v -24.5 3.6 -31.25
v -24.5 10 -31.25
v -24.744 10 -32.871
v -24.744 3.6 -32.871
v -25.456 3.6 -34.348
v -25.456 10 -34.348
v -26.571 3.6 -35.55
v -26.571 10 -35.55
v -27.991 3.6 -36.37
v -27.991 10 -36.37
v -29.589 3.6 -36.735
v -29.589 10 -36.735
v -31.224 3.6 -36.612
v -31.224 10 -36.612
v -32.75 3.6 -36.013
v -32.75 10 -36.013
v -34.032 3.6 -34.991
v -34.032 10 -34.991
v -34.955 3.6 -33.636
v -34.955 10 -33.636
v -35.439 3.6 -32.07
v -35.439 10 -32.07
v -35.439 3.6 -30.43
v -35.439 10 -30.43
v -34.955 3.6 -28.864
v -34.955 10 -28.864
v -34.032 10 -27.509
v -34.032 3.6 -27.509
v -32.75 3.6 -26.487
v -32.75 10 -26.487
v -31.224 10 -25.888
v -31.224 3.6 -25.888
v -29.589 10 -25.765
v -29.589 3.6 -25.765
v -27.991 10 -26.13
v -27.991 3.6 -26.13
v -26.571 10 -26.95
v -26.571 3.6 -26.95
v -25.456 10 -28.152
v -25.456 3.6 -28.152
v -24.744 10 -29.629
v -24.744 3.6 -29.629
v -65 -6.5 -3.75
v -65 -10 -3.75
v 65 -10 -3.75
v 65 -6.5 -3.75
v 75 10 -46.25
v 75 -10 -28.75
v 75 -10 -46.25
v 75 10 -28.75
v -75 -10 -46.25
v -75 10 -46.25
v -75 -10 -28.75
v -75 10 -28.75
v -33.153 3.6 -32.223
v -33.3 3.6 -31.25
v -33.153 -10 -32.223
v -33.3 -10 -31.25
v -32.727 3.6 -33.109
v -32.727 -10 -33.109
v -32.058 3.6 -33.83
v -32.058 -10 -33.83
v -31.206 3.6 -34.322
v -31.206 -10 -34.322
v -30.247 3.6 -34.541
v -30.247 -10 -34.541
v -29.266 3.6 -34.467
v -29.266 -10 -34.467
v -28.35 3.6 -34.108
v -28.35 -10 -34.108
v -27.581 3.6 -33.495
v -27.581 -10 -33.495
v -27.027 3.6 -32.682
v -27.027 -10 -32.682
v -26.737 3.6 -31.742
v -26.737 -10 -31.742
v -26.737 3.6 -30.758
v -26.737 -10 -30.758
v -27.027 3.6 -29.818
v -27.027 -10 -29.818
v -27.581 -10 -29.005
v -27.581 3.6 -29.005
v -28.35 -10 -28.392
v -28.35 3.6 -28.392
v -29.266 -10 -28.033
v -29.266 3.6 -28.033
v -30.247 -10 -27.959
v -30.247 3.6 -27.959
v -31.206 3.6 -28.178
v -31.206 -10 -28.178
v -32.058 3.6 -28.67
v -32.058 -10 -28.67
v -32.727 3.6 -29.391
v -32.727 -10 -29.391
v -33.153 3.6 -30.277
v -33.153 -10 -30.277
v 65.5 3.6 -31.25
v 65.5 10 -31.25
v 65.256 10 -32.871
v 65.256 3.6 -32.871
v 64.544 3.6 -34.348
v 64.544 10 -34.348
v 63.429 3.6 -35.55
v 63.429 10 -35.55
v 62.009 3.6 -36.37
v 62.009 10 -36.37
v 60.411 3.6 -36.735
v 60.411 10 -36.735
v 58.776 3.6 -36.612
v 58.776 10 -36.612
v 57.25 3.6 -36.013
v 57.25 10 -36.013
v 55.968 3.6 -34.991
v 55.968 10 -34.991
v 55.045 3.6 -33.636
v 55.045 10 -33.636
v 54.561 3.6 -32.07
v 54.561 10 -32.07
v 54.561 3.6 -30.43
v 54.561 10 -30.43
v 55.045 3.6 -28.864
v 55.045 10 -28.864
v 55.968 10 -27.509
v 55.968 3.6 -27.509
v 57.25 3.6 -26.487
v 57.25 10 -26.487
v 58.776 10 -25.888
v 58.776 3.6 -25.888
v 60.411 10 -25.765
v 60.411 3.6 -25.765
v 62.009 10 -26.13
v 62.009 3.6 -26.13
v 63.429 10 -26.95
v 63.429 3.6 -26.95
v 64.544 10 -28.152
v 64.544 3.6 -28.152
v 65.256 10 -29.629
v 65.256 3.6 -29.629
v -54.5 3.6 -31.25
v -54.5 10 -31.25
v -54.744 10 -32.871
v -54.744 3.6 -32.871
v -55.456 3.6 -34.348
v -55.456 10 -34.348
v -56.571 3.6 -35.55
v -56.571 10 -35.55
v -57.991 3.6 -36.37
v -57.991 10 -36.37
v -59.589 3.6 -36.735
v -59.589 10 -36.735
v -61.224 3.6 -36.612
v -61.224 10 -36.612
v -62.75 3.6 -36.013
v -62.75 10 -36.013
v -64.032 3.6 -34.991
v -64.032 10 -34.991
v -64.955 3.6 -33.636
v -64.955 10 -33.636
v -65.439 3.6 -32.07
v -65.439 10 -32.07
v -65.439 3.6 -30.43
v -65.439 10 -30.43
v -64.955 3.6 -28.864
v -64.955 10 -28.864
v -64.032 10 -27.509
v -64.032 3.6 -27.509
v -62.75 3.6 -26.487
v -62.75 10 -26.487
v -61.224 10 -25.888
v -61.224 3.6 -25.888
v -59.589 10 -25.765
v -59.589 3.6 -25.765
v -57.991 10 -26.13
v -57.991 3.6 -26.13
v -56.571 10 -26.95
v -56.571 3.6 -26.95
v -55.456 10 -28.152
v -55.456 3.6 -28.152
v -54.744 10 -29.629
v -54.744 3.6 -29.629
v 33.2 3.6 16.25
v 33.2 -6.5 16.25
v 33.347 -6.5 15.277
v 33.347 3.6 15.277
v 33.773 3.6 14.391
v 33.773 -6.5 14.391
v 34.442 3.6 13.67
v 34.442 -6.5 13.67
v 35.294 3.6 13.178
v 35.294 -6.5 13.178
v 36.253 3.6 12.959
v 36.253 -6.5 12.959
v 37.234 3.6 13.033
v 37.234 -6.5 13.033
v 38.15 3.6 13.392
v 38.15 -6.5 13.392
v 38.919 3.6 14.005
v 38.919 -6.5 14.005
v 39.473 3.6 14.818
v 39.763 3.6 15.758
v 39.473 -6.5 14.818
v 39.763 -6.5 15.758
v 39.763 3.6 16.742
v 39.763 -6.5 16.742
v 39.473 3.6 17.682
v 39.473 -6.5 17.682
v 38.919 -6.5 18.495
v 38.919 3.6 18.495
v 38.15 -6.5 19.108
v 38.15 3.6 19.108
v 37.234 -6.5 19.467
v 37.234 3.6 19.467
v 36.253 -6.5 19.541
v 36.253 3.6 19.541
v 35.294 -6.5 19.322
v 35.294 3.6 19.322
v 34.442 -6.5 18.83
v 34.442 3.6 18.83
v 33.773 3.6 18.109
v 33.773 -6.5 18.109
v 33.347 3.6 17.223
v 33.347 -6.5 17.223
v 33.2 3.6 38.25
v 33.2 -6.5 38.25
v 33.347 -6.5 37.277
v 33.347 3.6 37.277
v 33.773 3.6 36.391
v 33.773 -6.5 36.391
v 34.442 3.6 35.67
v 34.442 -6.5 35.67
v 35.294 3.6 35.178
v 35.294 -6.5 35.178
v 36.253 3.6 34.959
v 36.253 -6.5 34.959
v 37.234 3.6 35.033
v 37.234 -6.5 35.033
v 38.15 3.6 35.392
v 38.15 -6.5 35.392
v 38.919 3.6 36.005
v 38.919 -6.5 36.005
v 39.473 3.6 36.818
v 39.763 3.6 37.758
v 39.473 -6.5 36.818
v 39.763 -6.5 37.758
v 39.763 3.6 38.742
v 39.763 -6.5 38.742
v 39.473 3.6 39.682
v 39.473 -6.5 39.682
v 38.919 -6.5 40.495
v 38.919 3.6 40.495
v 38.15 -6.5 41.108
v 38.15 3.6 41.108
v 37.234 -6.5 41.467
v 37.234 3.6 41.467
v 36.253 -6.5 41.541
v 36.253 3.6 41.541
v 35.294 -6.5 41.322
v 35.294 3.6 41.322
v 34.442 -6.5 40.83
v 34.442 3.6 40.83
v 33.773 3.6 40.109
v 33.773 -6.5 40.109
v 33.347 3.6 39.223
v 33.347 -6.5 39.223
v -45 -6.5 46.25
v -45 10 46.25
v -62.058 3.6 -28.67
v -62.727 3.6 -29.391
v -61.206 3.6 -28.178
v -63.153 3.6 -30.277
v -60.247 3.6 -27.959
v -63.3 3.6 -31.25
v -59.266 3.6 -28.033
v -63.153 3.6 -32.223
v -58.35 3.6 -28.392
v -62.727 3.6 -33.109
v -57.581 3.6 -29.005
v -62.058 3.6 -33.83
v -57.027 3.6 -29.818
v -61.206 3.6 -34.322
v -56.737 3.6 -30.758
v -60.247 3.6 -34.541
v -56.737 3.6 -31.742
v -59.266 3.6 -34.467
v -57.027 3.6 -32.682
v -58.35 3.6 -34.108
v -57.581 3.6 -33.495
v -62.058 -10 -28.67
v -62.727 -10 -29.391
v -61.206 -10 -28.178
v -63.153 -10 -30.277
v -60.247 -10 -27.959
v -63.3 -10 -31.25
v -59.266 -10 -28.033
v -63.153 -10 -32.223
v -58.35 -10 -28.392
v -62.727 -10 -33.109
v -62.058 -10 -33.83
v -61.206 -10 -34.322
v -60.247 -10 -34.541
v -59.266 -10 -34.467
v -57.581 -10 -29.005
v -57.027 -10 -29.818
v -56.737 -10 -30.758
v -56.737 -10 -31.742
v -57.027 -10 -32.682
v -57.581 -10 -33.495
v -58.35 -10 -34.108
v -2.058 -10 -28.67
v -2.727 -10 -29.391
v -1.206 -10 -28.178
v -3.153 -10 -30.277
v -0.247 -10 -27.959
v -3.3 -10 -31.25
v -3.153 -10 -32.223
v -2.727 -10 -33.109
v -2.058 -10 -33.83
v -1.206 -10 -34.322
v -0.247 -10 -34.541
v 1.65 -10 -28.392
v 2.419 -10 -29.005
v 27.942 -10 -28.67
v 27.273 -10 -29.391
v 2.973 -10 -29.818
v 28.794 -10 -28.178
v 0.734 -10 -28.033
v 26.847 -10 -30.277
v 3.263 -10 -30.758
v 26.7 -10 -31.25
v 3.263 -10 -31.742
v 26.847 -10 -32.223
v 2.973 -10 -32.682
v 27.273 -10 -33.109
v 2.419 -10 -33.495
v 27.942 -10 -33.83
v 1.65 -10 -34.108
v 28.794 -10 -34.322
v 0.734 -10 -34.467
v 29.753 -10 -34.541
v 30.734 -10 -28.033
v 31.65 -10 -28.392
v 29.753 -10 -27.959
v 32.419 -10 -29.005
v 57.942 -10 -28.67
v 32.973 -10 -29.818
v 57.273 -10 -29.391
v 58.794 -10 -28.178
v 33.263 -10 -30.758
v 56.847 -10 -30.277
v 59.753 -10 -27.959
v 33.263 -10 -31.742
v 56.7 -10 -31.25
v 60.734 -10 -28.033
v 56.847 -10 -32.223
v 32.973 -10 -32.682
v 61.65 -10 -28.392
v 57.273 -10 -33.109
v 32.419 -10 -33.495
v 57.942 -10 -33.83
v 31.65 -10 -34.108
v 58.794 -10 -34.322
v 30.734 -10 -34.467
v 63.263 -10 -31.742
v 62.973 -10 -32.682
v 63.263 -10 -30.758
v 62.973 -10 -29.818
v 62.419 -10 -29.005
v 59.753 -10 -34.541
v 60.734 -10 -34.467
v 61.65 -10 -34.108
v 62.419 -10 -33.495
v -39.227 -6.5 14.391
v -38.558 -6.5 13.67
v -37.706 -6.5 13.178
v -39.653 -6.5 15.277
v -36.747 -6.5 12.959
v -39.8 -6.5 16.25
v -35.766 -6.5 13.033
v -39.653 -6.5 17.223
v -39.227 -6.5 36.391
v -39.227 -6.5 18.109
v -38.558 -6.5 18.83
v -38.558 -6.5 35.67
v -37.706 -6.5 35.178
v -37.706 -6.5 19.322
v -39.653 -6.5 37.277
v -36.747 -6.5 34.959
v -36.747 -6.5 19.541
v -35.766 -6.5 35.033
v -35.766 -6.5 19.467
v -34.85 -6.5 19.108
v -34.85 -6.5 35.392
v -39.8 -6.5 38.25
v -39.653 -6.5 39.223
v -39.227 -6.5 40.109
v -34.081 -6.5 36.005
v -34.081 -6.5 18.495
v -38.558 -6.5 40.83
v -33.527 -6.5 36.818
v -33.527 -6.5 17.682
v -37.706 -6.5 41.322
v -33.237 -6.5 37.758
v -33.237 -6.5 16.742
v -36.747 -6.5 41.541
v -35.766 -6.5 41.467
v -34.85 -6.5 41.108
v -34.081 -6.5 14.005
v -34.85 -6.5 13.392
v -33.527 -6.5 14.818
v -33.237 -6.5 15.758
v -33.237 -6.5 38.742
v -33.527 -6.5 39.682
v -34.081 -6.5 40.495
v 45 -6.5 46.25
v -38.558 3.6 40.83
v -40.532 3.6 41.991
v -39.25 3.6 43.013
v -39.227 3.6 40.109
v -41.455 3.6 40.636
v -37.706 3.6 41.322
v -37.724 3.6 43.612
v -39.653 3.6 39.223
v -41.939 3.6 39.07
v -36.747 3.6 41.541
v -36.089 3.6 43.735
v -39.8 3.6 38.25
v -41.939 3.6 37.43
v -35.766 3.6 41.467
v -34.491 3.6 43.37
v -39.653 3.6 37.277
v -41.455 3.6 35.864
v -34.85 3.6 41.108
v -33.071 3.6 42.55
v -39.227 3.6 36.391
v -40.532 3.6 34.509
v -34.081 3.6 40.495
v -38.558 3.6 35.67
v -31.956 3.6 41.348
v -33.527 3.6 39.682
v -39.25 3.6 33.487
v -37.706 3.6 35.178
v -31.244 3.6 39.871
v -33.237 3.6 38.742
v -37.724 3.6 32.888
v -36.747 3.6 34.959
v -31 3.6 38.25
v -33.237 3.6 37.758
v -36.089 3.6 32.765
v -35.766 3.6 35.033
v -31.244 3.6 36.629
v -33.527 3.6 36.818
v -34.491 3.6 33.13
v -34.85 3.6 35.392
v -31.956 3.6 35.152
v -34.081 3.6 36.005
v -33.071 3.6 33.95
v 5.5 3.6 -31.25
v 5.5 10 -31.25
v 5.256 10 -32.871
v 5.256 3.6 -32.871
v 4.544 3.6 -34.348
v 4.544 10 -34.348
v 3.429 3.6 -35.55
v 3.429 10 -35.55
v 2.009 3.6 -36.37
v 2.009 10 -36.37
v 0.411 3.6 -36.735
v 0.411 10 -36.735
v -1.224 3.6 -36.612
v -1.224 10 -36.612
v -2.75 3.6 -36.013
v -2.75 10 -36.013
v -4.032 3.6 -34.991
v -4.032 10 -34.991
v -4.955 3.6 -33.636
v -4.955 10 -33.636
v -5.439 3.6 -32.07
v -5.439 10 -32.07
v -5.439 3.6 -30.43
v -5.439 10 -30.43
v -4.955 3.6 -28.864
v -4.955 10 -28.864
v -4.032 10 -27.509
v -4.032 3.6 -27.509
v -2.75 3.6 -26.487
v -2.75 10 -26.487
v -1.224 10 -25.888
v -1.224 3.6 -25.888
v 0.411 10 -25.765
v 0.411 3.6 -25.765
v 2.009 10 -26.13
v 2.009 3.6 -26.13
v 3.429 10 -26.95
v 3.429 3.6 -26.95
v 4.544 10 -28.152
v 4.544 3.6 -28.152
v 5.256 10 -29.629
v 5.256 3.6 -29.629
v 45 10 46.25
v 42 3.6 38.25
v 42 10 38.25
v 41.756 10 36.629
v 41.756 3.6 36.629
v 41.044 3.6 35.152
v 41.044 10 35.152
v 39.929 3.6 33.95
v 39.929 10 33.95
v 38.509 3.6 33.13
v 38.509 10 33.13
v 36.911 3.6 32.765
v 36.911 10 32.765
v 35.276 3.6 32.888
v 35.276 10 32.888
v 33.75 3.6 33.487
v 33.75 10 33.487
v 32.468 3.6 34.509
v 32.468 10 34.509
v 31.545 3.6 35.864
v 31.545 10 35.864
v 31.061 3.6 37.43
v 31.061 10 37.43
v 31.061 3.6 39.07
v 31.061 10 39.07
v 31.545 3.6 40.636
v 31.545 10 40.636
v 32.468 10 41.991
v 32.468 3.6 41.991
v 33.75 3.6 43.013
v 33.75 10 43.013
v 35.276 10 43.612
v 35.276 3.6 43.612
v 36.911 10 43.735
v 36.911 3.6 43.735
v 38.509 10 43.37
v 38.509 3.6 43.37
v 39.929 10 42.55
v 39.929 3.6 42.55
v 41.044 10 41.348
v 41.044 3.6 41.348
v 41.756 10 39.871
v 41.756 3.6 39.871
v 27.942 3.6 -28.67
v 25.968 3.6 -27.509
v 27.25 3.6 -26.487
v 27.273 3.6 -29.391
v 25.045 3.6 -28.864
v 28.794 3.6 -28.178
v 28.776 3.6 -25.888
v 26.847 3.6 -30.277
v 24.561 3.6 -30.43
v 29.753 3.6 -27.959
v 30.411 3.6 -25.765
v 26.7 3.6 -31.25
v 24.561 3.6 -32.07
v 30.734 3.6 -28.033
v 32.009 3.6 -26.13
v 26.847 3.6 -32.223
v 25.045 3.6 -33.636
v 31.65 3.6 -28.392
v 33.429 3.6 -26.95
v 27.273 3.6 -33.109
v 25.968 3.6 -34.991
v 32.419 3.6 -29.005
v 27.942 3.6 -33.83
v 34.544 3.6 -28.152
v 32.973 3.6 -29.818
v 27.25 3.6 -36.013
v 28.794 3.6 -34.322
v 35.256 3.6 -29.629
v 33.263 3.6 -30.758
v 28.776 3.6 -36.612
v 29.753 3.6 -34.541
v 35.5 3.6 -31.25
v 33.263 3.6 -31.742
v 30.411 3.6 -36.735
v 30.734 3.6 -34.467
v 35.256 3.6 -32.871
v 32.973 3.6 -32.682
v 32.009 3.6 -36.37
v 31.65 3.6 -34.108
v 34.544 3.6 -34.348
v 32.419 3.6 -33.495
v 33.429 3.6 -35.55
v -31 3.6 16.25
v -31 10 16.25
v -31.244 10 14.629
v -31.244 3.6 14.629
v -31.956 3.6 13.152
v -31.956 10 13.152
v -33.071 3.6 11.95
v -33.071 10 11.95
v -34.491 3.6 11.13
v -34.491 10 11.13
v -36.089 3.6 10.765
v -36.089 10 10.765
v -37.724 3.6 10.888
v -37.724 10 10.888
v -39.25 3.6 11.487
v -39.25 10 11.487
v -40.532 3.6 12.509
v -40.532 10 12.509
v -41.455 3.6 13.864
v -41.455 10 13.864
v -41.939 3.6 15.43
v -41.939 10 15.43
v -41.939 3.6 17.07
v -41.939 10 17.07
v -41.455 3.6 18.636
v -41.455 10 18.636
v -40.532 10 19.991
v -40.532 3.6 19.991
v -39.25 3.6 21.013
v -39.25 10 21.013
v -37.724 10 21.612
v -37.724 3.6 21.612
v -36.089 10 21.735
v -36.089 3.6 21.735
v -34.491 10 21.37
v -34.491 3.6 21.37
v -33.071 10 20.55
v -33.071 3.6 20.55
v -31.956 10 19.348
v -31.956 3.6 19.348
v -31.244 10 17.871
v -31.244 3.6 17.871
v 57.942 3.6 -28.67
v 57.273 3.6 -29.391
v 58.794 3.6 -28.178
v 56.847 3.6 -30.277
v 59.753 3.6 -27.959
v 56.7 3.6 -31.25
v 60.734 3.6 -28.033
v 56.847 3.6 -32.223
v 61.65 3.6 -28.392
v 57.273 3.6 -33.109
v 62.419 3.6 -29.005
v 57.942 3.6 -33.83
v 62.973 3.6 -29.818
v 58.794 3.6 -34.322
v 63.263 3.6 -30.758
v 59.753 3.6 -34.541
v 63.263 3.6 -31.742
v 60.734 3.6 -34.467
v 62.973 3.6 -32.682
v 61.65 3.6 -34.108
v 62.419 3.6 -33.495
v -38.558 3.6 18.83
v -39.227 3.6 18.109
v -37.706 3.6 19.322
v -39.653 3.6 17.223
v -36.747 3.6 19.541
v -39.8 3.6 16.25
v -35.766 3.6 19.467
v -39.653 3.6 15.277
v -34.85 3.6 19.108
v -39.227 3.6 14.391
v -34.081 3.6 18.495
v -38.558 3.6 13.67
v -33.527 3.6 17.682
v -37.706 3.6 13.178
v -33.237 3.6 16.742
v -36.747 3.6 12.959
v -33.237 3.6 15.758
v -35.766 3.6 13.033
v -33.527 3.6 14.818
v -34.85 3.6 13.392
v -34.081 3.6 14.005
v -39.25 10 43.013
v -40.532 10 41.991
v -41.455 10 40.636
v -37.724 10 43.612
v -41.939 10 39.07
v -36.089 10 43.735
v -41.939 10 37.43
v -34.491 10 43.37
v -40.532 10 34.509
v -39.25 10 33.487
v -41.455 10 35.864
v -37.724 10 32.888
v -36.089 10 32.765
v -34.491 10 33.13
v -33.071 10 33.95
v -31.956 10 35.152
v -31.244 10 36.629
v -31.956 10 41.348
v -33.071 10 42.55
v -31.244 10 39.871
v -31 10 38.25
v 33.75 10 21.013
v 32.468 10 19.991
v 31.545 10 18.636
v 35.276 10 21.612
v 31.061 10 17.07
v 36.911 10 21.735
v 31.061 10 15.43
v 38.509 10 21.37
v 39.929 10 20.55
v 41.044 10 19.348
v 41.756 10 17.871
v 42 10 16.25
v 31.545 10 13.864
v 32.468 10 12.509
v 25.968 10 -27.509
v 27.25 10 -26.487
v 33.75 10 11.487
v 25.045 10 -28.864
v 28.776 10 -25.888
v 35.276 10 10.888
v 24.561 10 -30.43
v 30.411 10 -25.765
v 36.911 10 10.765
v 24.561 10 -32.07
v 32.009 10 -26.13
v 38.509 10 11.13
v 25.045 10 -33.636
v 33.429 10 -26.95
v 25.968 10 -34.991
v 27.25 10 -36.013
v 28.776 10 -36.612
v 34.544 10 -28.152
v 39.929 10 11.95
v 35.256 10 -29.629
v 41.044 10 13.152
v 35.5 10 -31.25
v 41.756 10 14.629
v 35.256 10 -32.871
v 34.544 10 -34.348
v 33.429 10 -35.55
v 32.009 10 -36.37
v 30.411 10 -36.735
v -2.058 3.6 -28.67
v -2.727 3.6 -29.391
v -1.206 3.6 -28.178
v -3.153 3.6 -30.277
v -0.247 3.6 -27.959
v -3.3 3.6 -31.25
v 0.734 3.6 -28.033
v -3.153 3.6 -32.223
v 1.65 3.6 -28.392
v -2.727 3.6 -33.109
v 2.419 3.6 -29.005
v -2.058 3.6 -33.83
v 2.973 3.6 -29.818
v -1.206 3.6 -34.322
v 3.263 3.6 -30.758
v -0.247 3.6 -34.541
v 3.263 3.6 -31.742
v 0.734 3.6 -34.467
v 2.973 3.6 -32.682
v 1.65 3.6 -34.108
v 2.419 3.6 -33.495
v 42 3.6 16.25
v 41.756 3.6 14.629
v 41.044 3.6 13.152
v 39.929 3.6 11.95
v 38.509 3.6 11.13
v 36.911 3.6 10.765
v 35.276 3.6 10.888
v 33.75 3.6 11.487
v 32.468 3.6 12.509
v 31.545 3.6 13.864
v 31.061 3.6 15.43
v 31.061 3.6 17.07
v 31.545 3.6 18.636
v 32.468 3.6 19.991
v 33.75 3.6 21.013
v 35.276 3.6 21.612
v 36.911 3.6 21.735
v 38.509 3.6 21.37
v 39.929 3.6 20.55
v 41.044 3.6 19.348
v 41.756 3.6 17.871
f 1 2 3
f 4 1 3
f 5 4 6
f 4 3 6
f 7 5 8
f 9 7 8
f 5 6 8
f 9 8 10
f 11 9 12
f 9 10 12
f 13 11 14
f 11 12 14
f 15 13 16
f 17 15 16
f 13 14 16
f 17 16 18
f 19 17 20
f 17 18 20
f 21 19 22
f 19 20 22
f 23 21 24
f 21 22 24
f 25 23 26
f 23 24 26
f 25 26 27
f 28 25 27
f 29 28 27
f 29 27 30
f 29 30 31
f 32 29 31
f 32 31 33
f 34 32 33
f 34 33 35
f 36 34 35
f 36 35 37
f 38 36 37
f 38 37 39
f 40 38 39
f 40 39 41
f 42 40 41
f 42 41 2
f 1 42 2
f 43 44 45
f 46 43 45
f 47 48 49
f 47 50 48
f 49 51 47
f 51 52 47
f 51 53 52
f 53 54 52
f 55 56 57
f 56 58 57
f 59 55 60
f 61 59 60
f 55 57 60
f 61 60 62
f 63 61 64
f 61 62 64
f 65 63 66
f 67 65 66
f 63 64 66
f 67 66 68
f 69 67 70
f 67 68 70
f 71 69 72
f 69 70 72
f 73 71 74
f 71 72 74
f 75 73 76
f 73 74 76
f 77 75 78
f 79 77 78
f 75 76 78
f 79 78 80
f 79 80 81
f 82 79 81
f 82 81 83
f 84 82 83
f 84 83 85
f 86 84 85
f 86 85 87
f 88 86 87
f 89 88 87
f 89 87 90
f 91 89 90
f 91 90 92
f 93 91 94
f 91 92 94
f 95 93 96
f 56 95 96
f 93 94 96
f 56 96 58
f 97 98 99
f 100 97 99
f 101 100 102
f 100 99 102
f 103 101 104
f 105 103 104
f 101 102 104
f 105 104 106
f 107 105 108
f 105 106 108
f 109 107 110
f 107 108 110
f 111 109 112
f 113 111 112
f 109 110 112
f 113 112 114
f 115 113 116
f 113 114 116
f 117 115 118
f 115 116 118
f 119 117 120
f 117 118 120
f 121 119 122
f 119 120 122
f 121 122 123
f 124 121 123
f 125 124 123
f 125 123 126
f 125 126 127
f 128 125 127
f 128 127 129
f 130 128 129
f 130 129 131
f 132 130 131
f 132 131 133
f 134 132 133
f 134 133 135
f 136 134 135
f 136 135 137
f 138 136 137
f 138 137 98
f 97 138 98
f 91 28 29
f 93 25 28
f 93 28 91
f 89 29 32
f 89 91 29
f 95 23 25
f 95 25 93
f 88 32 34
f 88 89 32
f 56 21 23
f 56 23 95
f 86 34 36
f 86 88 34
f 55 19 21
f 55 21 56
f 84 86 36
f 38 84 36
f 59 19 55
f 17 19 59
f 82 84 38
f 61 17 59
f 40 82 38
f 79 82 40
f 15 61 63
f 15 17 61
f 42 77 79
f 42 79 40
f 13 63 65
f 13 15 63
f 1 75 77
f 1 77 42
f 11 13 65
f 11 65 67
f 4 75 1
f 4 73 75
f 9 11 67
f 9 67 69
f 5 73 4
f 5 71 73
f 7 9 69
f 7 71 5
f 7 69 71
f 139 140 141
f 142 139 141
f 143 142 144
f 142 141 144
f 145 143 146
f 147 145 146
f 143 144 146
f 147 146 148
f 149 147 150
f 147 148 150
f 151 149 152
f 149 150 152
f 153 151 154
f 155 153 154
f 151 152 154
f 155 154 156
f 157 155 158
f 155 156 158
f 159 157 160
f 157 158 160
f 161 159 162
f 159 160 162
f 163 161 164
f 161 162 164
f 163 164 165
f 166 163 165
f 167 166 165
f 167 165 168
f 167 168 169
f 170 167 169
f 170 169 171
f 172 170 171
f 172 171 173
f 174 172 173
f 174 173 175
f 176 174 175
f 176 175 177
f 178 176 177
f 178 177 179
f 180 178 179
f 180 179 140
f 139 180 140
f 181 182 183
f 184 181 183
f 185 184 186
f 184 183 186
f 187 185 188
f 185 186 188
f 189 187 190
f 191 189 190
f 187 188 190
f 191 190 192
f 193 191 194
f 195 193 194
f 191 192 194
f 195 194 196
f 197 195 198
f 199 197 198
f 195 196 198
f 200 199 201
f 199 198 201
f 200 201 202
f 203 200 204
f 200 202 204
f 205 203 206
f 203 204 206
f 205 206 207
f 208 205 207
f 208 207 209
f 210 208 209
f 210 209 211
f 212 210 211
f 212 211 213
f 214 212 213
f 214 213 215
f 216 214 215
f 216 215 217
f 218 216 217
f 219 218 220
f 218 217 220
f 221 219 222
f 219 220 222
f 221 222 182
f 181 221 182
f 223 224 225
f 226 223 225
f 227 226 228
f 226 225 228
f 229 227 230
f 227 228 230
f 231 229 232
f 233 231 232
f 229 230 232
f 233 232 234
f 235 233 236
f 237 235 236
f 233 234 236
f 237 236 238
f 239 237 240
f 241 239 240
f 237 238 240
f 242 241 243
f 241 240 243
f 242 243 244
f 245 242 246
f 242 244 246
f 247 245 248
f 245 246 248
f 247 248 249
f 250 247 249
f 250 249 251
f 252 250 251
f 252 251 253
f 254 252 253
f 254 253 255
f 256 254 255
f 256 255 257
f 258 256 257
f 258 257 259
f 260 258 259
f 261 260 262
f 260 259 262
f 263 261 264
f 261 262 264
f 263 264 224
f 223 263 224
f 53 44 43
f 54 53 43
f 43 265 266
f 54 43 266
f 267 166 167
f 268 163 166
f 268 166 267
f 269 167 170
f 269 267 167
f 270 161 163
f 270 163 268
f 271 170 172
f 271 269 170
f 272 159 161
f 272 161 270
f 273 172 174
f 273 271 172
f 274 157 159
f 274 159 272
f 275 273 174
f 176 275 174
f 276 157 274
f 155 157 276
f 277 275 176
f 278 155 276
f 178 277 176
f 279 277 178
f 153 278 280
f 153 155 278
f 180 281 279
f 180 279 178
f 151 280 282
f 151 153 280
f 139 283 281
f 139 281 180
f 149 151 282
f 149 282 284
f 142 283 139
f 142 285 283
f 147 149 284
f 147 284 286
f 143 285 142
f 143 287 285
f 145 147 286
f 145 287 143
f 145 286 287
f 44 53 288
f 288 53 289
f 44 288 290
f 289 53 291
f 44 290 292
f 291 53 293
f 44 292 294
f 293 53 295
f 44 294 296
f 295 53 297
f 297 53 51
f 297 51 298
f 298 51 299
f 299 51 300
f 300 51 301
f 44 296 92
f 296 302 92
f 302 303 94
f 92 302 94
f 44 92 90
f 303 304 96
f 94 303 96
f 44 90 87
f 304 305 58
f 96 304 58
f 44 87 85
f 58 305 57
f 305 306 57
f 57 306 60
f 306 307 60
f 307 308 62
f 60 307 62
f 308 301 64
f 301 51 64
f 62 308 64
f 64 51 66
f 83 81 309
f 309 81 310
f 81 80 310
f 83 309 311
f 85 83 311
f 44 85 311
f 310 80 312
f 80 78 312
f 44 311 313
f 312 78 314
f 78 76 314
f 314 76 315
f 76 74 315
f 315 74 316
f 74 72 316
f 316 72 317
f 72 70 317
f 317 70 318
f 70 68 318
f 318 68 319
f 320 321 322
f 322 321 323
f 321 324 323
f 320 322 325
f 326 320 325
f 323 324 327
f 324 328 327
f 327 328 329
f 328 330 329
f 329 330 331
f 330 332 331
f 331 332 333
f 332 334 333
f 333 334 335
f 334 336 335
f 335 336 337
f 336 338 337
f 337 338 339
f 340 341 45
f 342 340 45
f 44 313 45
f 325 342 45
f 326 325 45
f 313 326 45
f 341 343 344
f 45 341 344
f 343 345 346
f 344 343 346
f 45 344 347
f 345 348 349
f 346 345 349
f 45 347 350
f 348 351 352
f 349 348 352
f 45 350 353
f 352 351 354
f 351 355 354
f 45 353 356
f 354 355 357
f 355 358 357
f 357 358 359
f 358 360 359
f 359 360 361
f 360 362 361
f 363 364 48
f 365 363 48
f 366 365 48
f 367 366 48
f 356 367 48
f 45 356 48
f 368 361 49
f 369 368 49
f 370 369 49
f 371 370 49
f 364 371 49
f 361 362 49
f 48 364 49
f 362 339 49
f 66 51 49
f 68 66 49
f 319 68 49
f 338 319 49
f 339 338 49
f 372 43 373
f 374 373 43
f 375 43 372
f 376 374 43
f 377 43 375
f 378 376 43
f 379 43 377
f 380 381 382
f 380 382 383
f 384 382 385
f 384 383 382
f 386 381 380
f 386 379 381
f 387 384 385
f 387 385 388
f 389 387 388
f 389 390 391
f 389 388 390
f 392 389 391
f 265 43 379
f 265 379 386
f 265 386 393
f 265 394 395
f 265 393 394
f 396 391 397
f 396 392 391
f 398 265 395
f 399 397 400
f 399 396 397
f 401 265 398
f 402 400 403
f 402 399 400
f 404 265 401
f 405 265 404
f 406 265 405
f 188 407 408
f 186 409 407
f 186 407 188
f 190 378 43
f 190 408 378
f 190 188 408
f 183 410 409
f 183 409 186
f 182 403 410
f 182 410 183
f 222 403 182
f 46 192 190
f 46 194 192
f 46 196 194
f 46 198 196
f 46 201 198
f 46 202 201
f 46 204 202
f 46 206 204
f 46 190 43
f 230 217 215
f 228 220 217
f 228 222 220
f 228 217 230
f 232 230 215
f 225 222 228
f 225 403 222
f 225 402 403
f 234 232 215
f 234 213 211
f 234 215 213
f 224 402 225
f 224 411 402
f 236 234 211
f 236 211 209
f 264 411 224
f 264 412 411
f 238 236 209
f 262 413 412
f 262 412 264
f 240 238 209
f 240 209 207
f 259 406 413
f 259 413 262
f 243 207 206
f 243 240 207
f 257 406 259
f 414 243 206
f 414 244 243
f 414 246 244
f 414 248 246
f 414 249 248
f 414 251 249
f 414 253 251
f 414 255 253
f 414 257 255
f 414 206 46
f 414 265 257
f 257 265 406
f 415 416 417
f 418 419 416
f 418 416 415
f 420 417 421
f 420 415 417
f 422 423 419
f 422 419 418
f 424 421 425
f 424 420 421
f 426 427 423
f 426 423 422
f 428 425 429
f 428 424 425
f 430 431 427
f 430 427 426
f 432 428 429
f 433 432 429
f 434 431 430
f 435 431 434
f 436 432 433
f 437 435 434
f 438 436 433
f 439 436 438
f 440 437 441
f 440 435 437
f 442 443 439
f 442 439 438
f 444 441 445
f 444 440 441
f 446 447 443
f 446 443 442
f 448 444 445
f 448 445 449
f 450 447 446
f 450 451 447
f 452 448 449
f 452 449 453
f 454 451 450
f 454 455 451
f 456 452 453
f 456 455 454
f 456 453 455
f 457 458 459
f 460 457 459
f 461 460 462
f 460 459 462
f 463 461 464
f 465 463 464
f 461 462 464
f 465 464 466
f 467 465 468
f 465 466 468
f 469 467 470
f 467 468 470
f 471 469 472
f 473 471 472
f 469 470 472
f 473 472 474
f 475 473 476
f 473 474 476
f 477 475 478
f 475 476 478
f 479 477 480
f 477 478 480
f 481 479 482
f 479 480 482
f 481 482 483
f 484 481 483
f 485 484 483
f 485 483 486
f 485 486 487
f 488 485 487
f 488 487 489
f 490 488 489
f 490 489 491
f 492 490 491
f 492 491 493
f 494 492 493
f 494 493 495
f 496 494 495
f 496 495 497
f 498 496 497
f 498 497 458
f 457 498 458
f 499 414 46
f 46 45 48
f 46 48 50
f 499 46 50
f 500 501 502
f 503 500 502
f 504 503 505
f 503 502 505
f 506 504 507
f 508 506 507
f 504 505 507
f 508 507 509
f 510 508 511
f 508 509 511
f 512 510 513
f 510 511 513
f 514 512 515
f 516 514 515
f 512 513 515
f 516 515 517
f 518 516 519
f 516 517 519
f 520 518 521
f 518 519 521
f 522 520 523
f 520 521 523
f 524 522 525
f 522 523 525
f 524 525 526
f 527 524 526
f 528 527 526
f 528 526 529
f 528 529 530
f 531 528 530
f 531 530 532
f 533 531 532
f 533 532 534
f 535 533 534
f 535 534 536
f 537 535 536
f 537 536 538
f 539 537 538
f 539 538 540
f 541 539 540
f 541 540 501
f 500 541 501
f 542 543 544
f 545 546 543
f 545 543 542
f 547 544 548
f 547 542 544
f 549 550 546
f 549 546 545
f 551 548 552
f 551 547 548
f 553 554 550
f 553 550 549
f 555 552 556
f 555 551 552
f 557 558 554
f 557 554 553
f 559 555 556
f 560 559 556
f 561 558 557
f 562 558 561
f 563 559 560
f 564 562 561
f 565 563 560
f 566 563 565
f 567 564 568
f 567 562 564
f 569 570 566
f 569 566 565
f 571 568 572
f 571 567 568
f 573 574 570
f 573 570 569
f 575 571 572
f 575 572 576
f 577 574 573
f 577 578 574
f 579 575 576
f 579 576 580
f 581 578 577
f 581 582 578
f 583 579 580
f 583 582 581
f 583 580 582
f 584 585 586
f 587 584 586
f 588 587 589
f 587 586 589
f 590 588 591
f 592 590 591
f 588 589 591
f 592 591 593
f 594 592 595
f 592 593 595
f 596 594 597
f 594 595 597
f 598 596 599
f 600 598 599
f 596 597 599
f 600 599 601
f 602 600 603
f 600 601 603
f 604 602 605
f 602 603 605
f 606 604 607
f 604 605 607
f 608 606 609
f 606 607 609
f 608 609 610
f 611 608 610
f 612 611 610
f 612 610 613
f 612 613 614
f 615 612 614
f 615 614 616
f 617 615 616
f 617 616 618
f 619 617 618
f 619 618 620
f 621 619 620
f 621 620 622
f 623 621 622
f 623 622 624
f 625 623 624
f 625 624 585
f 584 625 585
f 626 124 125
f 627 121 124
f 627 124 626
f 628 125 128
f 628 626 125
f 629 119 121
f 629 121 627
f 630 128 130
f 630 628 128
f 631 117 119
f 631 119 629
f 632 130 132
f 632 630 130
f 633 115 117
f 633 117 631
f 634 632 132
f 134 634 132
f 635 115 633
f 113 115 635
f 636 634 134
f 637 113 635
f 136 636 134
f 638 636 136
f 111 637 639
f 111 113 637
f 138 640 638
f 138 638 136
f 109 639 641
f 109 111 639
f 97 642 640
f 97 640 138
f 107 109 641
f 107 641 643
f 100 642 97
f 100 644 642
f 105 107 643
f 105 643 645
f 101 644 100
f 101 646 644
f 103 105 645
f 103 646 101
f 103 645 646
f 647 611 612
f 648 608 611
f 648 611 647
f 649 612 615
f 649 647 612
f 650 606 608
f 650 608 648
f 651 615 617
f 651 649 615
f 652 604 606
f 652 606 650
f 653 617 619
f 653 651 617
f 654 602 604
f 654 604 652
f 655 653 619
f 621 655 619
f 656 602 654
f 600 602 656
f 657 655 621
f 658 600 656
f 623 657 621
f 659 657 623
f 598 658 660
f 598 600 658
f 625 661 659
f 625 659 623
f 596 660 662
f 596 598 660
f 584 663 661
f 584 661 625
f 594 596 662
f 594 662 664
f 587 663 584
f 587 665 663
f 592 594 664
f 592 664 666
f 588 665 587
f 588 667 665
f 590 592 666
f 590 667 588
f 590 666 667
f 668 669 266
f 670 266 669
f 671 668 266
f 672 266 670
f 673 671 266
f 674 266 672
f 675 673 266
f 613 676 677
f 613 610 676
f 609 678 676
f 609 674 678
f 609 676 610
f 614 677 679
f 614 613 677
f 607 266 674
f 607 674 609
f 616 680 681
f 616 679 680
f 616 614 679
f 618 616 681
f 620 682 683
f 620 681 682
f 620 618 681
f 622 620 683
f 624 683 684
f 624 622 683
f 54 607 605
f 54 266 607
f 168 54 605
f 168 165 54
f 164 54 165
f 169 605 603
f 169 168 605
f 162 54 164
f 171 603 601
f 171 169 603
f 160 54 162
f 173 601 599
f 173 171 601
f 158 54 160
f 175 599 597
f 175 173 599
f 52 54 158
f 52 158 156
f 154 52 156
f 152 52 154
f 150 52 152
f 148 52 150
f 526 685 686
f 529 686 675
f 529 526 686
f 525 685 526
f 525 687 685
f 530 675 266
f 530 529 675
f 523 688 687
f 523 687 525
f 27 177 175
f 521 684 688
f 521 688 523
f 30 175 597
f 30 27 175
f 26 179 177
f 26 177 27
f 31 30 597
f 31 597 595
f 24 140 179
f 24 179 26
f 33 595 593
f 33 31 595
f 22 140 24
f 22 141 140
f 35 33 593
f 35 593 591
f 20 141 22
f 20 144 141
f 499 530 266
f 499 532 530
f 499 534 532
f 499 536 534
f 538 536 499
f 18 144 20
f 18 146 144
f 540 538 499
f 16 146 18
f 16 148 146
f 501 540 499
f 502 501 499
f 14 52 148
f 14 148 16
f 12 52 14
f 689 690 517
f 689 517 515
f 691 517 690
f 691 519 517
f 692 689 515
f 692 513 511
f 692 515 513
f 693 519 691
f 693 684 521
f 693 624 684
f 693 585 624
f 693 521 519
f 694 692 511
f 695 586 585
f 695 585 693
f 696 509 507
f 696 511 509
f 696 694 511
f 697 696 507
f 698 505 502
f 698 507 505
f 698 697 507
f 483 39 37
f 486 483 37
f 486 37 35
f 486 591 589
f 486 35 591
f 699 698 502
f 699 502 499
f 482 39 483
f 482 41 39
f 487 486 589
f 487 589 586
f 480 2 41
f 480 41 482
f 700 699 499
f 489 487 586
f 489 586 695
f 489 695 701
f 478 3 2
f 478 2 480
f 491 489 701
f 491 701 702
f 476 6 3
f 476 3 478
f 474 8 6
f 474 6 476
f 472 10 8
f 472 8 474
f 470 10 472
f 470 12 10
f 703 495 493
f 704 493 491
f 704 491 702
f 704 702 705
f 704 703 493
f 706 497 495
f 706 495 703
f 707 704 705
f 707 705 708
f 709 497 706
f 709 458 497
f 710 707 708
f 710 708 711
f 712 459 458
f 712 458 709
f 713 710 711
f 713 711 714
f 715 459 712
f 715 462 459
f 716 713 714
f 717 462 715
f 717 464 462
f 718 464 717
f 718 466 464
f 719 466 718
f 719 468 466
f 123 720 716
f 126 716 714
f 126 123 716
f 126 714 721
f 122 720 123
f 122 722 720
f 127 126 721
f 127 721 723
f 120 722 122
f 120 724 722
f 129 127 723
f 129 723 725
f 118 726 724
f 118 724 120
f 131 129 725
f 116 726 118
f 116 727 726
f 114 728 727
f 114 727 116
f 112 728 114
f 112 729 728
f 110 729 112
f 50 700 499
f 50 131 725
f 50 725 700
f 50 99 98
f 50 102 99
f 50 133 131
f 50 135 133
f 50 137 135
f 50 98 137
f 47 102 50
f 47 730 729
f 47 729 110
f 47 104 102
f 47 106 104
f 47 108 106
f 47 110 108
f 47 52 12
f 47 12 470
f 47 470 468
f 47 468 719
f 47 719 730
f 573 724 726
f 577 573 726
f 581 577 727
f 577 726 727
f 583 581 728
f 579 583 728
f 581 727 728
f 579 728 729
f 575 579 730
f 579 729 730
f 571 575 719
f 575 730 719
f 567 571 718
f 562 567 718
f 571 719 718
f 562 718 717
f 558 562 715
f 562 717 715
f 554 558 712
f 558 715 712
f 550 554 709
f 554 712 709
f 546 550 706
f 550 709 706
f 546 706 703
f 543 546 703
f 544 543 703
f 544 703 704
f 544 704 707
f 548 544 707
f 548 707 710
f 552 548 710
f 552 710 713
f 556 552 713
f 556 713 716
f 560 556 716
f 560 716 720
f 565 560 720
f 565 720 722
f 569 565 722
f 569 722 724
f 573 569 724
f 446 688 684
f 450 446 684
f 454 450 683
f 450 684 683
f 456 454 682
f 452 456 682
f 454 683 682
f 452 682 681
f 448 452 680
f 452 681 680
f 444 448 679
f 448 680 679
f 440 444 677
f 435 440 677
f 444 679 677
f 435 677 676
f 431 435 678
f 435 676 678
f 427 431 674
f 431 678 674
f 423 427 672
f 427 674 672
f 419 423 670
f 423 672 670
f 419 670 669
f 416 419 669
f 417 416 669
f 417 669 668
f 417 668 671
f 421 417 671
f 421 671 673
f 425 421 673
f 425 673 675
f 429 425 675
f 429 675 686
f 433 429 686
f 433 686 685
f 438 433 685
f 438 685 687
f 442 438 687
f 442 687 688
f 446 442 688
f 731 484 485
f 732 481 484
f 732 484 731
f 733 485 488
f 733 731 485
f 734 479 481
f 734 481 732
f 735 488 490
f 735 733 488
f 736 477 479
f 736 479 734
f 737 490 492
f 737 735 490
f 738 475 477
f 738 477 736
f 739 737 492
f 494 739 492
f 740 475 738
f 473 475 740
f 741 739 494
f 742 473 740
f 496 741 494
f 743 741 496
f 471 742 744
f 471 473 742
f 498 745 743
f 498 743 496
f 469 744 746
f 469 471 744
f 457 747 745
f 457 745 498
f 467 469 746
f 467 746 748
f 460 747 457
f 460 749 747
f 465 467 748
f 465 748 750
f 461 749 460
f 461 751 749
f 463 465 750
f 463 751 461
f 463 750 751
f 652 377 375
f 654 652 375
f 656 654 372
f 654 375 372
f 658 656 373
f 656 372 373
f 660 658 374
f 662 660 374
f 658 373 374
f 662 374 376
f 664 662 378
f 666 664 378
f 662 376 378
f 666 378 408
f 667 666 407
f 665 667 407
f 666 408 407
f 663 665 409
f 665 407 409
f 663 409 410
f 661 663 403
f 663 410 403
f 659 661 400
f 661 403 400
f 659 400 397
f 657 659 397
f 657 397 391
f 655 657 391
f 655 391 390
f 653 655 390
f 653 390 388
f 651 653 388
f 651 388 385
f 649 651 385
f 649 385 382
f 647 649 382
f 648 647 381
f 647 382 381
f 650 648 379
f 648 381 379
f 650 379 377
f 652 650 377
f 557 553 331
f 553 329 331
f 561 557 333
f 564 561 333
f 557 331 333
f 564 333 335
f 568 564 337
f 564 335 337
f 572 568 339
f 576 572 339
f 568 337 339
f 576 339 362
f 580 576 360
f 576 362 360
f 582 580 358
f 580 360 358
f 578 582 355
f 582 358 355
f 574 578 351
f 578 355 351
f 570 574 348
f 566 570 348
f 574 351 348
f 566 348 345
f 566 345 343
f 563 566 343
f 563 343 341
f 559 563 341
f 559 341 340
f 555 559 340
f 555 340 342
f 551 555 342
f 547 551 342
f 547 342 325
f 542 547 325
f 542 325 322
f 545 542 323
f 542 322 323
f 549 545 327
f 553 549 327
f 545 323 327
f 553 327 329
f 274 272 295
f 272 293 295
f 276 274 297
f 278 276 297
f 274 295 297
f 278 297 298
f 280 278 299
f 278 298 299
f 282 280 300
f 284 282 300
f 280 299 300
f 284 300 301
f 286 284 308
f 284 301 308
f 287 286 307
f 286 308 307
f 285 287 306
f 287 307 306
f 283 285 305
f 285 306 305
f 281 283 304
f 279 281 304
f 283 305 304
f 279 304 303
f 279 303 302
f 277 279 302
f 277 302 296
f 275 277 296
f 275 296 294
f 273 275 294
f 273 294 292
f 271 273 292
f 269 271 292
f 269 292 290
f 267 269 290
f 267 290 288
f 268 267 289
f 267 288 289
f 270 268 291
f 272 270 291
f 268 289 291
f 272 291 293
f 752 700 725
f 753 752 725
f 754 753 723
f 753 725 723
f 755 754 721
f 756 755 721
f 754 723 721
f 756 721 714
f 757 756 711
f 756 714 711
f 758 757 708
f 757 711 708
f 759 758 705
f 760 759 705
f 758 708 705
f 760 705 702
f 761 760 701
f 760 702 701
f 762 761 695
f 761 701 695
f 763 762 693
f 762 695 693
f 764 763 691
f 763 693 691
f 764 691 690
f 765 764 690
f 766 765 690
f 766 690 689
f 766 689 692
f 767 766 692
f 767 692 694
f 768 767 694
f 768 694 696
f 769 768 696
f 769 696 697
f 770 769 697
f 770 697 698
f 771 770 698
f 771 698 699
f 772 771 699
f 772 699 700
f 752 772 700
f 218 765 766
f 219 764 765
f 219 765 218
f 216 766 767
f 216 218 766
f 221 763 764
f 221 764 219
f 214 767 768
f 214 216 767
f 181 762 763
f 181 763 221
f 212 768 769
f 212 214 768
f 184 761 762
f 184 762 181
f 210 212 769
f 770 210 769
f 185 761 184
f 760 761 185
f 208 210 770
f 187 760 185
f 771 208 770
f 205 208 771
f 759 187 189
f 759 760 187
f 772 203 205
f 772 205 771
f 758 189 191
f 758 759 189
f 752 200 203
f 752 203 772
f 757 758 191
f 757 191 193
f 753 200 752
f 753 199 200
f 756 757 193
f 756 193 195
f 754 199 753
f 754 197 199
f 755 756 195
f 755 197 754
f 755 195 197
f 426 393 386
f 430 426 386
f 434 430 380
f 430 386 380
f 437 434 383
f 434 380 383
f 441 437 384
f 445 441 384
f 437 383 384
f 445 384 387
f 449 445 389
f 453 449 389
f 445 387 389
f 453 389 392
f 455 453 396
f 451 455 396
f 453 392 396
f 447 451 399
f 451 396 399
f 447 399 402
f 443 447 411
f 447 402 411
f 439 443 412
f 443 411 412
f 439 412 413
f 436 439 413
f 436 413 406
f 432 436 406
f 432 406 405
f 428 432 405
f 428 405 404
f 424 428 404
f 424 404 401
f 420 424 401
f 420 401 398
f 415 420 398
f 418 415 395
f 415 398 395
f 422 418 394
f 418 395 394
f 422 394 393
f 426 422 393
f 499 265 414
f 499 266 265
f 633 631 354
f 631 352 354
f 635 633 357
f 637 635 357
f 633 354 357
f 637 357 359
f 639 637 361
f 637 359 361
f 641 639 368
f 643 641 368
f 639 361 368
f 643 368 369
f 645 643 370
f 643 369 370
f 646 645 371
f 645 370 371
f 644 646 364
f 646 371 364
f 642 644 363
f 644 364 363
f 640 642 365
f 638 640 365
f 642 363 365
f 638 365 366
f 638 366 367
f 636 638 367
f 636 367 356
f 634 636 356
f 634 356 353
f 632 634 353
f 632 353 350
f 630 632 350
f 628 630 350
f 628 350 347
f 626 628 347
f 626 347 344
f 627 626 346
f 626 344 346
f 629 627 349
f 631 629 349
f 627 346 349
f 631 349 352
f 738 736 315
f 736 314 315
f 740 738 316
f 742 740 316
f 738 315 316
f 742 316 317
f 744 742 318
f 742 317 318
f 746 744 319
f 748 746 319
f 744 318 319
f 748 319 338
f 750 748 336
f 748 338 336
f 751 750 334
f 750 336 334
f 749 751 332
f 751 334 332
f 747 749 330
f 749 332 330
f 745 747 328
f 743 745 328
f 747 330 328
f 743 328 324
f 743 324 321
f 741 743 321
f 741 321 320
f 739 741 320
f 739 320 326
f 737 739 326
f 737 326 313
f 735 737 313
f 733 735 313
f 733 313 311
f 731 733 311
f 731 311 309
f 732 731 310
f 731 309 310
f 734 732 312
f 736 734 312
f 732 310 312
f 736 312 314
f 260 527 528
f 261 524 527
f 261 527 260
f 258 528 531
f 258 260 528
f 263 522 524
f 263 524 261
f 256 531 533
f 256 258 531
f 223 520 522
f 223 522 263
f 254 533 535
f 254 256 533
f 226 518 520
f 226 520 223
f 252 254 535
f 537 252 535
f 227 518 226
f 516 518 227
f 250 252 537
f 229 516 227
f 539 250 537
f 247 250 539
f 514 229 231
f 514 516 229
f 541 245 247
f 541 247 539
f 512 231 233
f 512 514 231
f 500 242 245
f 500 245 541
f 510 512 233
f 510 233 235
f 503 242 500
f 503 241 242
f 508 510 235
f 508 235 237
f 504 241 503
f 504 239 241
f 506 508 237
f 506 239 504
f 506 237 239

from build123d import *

# Parameters (mm, degrees)
SKETCH1_W                                           = 150
SKETCH1_H                                           = 92.5
BOSS_EXTRUDE1_DEPTH                                 = 10
CHAMFER2_SIZE                                       = 75
CHAMFER2_SIZE2                                      = 30
CHAMFER3_SIZE                                       = 30
CHAMFER3_SIZE2                                      = 75
CBORE_FOR_M6_HEX_SOCKET_HEAD_CAP_SCREW1_D           = 6.6
CBORE_FOR_M6_HEX_SOCKET_HEAD_CAP_SCREW1_CBORE_D     = 11
CBORE_FOR_M6_HEX_SOCKET_HEAD_CAP_SCREW1_CBORE_DEPTH = 6.4
CBORE_FOR_M6_HEX_SOCKET_HEAD_CAP_SCREW2_D           = 6.6
CBORE_FOR_M6_HEX_SOCKET_HEAD_CAP_SCREW2_CBORE_D     = 11
CBORE_FOR_M6_HEX_SOCKET_HEAD_CAP_SCREW2_CBORE_DEPTH = 6.4
SKETCH11_W                                          = 150
SKETCH11_H                                          = 60
CUT_EXTRUDE1_DEPTH                                  = 3.5


with BuildPart() as part:
    # Sketch1 → Boss-Extrude1 (new, symmetric)
    with BuildSketch(Plane(origin=(0, 0, 0), x_dir=(1, 0, 0), z_dir=(0, 1, 0))):
        Rectangle(SKETCH1_W, SKETCH1_H)
    extrude(amount=BOSS_EXTRUDE1_DEPTH, both=True)

    # Chamfer2
    chamfer2_edges = [part.edges().sort_by_distance(p)[0] for p in [
        (-75, 0, 46.25),
    ]]
    chamfer2_side = [part.faces().sort_by_distance(p)[0] for p in [
        (-75, 0, 0),
    ]]
    chamfer(chamfer2_edges, length=CHAMFER2_SIZE, length2=CHAMFER2_SIZE2, reference=chamfer2_side[0])

    # Chamfer3
    chamfer3_edges = [part.edges().sort_by_distance(p)[0] for p in [
        (75, 0, 46.25),
    ]]
    chamfer3_side = [part.faces().sort_by_distance(p)[0] for p in [
        (15, 0, 46.25),
    ]]
    chamfer(chamfer3_edges, length=CHAMFER3_SIZE, length2=CHAMFER3_SIZE2, reference=chamfer3_side[0])

    # CBORE for M6 Hex Socket Head Cap Screw1 (through all)
    with Locations(Plane(origin=(0, 10, 0), x_dir=(1, 0, 0), z_dir=(0, 1, 0))):
        with Locations((-60, 31.25), (-30, 31.25), (0, 31.25), (30, 31.25), (60, 31.25)):
            CounterBoreHole(CBORE_FOR_M6_HEX_SOCKET_HEAD_CAP_SCREW1_D / 2, CBORE_FOR_M6_HEX_SOCKET_HEAD_CAP_SCREW1_CBORE_D / 2, CBORE_FOR_M6_HEX_SOCKET_HEAD_CAP_SCREW1_CBORE_DEPTH)

    # CBORE for M6 Hex Socket Head Cap Screw2 (through all)
    with Locations(Plane(origin=(0, 10, 0), x_dir=(1, 0, 0), z_dir=(0, 1, 0))):
        with Locations((-36.5, -38.25), (-36.5, -16.25), (36.5, -16.25), (36.5, -38.25)):
            CounterBoreHole(CBORE_FOR_M6_HEX_SOCKET_HEAD_CAP_SCREW2_D / 2, CBORE_FOR_M6_HEX_SOCKET_HEAD_CAP_SCREW2_CBORE_D / 2, CBORE_FOR_M6_HEX_SOCKET_HEAD_CAP_SCREW2_CBORE_DEPTH)

    # Sketch11 → Cut-Extrude1 (cut)
    with BuildSketch(Plane.XZ.offset(10)):
        with Locations((0, 26.25)):
            Rectangle(SKETCH11_W, SKETCH11_H)
    extrude(amount=-CUT_EXTRUDE1_DEPTH, mode=Mode.SUBTRACT)


solid = part.part
